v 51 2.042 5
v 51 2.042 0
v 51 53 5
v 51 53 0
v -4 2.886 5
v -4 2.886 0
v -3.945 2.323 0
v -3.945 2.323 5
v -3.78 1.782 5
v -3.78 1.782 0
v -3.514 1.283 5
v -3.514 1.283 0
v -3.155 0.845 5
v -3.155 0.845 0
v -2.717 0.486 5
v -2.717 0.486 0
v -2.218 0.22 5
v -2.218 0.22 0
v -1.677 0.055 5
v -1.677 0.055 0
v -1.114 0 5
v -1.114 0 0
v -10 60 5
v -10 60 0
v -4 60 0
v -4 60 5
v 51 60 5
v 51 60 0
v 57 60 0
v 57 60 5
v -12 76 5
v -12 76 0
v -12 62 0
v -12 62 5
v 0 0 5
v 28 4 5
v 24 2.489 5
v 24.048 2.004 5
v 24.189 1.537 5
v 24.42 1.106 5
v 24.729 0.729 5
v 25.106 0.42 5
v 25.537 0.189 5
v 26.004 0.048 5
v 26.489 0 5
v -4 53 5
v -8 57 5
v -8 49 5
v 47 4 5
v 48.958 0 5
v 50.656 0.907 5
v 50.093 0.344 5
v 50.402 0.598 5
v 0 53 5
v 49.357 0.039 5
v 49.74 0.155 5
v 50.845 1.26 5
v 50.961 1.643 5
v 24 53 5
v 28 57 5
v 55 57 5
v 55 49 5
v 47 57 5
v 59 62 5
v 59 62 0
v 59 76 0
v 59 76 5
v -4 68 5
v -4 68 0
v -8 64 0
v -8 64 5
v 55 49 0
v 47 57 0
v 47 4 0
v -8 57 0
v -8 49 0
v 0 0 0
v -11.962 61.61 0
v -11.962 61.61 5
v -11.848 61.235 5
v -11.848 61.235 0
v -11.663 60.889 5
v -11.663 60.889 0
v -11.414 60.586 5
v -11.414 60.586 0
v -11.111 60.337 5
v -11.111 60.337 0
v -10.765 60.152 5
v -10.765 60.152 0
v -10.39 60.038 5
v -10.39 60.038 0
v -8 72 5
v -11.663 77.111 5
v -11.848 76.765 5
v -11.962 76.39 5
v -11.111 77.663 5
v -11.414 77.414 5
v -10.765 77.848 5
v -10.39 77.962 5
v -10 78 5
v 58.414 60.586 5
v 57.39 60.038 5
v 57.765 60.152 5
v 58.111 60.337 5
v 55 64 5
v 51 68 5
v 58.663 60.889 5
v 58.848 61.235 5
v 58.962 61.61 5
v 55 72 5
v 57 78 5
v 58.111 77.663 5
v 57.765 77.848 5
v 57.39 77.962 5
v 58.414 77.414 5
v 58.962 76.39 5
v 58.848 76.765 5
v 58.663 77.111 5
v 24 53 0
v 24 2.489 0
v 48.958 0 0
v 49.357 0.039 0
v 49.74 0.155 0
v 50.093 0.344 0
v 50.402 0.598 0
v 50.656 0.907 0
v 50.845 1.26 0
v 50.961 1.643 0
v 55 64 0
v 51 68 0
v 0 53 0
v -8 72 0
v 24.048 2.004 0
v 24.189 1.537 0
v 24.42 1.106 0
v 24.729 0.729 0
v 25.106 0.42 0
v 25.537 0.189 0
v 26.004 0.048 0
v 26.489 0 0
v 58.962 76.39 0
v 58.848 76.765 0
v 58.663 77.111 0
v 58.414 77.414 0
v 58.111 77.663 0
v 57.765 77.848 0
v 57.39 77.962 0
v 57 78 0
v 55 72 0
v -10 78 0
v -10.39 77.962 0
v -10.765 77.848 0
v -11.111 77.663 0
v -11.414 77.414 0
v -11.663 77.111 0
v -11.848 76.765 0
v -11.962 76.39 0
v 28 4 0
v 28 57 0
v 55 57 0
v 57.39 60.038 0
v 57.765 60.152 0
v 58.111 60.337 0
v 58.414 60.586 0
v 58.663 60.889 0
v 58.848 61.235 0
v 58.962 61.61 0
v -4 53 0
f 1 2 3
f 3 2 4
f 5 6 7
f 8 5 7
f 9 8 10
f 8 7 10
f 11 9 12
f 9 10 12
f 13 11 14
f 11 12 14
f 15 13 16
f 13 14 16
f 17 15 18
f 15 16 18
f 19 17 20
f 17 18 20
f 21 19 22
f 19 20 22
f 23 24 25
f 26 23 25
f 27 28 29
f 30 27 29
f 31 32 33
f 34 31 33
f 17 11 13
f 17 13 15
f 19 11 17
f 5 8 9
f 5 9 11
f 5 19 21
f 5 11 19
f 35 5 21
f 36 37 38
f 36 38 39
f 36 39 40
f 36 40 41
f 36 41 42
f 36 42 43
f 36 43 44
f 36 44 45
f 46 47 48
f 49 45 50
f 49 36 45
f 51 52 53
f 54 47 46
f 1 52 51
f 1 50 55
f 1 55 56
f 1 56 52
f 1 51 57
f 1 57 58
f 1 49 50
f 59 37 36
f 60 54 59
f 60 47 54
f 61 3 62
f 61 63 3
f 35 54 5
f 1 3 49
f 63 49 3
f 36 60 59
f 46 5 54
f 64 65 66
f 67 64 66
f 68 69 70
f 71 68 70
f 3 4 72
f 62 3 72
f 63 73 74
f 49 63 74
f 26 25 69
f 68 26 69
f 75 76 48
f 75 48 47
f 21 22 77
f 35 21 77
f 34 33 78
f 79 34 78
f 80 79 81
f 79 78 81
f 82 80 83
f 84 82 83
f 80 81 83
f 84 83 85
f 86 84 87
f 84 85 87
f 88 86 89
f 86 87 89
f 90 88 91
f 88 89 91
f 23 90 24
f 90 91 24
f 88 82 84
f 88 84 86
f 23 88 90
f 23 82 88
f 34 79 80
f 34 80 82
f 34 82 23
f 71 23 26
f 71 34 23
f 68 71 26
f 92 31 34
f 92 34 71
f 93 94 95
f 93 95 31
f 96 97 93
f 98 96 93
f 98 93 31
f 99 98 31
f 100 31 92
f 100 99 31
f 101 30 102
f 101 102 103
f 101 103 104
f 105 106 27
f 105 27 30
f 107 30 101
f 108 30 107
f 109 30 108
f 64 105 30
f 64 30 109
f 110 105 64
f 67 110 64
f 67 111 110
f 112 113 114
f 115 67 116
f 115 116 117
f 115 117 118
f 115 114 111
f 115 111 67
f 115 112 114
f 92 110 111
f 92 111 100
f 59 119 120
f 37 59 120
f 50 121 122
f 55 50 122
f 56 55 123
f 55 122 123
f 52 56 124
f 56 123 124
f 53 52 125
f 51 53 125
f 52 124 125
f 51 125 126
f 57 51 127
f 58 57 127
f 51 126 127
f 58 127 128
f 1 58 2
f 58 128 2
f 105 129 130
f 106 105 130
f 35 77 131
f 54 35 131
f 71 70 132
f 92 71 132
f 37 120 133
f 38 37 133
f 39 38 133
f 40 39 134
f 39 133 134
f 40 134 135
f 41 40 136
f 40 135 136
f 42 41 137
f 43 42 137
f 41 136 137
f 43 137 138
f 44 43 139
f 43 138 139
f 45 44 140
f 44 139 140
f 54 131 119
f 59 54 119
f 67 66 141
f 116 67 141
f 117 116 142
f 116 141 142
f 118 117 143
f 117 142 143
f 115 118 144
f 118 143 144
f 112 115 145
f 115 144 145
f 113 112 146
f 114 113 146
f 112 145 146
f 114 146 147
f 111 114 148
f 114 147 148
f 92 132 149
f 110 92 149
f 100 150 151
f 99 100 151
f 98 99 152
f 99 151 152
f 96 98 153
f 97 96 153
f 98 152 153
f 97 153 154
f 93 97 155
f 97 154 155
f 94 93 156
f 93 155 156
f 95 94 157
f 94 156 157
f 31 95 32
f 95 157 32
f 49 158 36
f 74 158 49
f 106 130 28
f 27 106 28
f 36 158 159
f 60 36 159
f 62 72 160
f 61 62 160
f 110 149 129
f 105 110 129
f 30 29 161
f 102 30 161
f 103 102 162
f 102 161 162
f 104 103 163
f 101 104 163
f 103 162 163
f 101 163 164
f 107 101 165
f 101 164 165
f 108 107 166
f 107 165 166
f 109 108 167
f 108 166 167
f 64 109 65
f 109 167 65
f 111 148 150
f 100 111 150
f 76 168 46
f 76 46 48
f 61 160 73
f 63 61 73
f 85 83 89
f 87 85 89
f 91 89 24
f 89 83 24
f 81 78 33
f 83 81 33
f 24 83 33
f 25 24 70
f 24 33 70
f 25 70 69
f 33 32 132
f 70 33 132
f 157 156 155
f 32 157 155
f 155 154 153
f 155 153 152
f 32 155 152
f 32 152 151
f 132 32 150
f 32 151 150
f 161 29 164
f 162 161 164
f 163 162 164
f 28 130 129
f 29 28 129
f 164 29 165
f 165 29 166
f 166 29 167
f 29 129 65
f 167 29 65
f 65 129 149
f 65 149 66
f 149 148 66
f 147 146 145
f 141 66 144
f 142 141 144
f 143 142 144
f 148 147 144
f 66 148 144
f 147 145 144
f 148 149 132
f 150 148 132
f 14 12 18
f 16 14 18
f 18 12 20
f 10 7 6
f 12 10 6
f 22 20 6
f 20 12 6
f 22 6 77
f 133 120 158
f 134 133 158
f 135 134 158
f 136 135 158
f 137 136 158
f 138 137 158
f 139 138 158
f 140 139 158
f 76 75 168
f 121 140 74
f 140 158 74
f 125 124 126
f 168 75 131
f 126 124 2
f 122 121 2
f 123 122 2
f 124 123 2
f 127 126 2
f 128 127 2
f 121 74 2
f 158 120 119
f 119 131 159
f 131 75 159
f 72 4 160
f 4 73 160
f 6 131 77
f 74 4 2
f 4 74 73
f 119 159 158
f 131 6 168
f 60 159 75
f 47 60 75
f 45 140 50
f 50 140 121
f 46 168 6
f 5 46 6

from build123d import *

# Parameters (mm, degrees)
PAD_DEPTH    = 5
PAD001_DEPTH = 5


with BuildPart() as body0000:
    # Sketch → Pad (new body)
    with BuildSketch(Plane.XY):
        with BuildLine():
            Line((0, 0), (0, 53))
            Line((0, 53), (24, 53))
            Line((24, 53), (24, 2.4894))
            ThreePointArc((24, 2.4894), (24.729128, 0.729128), (26.4894, 0))
            Line((26.4894, 0), (48.95835, 0))
            ThreePointArc((48.95835, 0), (50.402015, 0.597985), (51, 2.04165))
            Line((51, 2.04165), (51, 53))
            Line((51, 53), (55, 49))
            Line((55, 49), (55, 57))
            Line((55, 57), (50.996145, 57))
            Line((50.996145, 57), (47, 57))
            Line((47, 57), (47, 4))
            Line((28, 4), (47, 4))
            Line((28, 4), (28, 57))
            Line((28, 57), (-4, 57))
            Line((-8, 57), (-4, 57))
            Line((-8, 49), (-8, 57))
            Line((-4, 53), (-8, 49))
            Line((-4, 53), (-4, 2.885931))
            ThreePointArc((-4, 2.885931), (-3.15473, 0.84527), (-1.114069, 0))
            Line((-1.114069, 0), (0, 0))
        make_face()
    extrude(amount=PAD_DEPTH)


with BuildPart() as body001:
    # Sketch001 → Pad001 (new body)
    with BuildSketch(Plane.XY):
        with BuildLine():
            Line((-8, 72), (55, 72))
            Line((55, 72), (55, 64))
            Line((55, 64), (51, 68))
            Line((51, 68), (51, 60))
            Line((51, 60), (57, 60))
            ThreePointArc((57, 60), (58.414214, 60.585786), (59, 62))
            Line((59, 62), (59, 76))
            ThreePointArc((59, 76), (58.414214, 77.414214), (57, 78))
            Line((57, 78), (-10, 78))
            ThreePointArc((-10, 78), (-11.414214, 77.414214), (-12, 76))
            Line((-12, 76), (-12, 62))
            ThreePointArc((-12, 62), (-11.414214, 60.585786), (-10, 60))
            Line((-10, 60), (-4, 60))
            Line((-4, 60), (-4, 68))
            Line((-4, 68), (-8, 64))
            Line((-8, 64), (-8, 72))
        make_face()
    extrude(amount=PAD001_DEPTH)


solid = Compound([body0000.part, body001.part])
